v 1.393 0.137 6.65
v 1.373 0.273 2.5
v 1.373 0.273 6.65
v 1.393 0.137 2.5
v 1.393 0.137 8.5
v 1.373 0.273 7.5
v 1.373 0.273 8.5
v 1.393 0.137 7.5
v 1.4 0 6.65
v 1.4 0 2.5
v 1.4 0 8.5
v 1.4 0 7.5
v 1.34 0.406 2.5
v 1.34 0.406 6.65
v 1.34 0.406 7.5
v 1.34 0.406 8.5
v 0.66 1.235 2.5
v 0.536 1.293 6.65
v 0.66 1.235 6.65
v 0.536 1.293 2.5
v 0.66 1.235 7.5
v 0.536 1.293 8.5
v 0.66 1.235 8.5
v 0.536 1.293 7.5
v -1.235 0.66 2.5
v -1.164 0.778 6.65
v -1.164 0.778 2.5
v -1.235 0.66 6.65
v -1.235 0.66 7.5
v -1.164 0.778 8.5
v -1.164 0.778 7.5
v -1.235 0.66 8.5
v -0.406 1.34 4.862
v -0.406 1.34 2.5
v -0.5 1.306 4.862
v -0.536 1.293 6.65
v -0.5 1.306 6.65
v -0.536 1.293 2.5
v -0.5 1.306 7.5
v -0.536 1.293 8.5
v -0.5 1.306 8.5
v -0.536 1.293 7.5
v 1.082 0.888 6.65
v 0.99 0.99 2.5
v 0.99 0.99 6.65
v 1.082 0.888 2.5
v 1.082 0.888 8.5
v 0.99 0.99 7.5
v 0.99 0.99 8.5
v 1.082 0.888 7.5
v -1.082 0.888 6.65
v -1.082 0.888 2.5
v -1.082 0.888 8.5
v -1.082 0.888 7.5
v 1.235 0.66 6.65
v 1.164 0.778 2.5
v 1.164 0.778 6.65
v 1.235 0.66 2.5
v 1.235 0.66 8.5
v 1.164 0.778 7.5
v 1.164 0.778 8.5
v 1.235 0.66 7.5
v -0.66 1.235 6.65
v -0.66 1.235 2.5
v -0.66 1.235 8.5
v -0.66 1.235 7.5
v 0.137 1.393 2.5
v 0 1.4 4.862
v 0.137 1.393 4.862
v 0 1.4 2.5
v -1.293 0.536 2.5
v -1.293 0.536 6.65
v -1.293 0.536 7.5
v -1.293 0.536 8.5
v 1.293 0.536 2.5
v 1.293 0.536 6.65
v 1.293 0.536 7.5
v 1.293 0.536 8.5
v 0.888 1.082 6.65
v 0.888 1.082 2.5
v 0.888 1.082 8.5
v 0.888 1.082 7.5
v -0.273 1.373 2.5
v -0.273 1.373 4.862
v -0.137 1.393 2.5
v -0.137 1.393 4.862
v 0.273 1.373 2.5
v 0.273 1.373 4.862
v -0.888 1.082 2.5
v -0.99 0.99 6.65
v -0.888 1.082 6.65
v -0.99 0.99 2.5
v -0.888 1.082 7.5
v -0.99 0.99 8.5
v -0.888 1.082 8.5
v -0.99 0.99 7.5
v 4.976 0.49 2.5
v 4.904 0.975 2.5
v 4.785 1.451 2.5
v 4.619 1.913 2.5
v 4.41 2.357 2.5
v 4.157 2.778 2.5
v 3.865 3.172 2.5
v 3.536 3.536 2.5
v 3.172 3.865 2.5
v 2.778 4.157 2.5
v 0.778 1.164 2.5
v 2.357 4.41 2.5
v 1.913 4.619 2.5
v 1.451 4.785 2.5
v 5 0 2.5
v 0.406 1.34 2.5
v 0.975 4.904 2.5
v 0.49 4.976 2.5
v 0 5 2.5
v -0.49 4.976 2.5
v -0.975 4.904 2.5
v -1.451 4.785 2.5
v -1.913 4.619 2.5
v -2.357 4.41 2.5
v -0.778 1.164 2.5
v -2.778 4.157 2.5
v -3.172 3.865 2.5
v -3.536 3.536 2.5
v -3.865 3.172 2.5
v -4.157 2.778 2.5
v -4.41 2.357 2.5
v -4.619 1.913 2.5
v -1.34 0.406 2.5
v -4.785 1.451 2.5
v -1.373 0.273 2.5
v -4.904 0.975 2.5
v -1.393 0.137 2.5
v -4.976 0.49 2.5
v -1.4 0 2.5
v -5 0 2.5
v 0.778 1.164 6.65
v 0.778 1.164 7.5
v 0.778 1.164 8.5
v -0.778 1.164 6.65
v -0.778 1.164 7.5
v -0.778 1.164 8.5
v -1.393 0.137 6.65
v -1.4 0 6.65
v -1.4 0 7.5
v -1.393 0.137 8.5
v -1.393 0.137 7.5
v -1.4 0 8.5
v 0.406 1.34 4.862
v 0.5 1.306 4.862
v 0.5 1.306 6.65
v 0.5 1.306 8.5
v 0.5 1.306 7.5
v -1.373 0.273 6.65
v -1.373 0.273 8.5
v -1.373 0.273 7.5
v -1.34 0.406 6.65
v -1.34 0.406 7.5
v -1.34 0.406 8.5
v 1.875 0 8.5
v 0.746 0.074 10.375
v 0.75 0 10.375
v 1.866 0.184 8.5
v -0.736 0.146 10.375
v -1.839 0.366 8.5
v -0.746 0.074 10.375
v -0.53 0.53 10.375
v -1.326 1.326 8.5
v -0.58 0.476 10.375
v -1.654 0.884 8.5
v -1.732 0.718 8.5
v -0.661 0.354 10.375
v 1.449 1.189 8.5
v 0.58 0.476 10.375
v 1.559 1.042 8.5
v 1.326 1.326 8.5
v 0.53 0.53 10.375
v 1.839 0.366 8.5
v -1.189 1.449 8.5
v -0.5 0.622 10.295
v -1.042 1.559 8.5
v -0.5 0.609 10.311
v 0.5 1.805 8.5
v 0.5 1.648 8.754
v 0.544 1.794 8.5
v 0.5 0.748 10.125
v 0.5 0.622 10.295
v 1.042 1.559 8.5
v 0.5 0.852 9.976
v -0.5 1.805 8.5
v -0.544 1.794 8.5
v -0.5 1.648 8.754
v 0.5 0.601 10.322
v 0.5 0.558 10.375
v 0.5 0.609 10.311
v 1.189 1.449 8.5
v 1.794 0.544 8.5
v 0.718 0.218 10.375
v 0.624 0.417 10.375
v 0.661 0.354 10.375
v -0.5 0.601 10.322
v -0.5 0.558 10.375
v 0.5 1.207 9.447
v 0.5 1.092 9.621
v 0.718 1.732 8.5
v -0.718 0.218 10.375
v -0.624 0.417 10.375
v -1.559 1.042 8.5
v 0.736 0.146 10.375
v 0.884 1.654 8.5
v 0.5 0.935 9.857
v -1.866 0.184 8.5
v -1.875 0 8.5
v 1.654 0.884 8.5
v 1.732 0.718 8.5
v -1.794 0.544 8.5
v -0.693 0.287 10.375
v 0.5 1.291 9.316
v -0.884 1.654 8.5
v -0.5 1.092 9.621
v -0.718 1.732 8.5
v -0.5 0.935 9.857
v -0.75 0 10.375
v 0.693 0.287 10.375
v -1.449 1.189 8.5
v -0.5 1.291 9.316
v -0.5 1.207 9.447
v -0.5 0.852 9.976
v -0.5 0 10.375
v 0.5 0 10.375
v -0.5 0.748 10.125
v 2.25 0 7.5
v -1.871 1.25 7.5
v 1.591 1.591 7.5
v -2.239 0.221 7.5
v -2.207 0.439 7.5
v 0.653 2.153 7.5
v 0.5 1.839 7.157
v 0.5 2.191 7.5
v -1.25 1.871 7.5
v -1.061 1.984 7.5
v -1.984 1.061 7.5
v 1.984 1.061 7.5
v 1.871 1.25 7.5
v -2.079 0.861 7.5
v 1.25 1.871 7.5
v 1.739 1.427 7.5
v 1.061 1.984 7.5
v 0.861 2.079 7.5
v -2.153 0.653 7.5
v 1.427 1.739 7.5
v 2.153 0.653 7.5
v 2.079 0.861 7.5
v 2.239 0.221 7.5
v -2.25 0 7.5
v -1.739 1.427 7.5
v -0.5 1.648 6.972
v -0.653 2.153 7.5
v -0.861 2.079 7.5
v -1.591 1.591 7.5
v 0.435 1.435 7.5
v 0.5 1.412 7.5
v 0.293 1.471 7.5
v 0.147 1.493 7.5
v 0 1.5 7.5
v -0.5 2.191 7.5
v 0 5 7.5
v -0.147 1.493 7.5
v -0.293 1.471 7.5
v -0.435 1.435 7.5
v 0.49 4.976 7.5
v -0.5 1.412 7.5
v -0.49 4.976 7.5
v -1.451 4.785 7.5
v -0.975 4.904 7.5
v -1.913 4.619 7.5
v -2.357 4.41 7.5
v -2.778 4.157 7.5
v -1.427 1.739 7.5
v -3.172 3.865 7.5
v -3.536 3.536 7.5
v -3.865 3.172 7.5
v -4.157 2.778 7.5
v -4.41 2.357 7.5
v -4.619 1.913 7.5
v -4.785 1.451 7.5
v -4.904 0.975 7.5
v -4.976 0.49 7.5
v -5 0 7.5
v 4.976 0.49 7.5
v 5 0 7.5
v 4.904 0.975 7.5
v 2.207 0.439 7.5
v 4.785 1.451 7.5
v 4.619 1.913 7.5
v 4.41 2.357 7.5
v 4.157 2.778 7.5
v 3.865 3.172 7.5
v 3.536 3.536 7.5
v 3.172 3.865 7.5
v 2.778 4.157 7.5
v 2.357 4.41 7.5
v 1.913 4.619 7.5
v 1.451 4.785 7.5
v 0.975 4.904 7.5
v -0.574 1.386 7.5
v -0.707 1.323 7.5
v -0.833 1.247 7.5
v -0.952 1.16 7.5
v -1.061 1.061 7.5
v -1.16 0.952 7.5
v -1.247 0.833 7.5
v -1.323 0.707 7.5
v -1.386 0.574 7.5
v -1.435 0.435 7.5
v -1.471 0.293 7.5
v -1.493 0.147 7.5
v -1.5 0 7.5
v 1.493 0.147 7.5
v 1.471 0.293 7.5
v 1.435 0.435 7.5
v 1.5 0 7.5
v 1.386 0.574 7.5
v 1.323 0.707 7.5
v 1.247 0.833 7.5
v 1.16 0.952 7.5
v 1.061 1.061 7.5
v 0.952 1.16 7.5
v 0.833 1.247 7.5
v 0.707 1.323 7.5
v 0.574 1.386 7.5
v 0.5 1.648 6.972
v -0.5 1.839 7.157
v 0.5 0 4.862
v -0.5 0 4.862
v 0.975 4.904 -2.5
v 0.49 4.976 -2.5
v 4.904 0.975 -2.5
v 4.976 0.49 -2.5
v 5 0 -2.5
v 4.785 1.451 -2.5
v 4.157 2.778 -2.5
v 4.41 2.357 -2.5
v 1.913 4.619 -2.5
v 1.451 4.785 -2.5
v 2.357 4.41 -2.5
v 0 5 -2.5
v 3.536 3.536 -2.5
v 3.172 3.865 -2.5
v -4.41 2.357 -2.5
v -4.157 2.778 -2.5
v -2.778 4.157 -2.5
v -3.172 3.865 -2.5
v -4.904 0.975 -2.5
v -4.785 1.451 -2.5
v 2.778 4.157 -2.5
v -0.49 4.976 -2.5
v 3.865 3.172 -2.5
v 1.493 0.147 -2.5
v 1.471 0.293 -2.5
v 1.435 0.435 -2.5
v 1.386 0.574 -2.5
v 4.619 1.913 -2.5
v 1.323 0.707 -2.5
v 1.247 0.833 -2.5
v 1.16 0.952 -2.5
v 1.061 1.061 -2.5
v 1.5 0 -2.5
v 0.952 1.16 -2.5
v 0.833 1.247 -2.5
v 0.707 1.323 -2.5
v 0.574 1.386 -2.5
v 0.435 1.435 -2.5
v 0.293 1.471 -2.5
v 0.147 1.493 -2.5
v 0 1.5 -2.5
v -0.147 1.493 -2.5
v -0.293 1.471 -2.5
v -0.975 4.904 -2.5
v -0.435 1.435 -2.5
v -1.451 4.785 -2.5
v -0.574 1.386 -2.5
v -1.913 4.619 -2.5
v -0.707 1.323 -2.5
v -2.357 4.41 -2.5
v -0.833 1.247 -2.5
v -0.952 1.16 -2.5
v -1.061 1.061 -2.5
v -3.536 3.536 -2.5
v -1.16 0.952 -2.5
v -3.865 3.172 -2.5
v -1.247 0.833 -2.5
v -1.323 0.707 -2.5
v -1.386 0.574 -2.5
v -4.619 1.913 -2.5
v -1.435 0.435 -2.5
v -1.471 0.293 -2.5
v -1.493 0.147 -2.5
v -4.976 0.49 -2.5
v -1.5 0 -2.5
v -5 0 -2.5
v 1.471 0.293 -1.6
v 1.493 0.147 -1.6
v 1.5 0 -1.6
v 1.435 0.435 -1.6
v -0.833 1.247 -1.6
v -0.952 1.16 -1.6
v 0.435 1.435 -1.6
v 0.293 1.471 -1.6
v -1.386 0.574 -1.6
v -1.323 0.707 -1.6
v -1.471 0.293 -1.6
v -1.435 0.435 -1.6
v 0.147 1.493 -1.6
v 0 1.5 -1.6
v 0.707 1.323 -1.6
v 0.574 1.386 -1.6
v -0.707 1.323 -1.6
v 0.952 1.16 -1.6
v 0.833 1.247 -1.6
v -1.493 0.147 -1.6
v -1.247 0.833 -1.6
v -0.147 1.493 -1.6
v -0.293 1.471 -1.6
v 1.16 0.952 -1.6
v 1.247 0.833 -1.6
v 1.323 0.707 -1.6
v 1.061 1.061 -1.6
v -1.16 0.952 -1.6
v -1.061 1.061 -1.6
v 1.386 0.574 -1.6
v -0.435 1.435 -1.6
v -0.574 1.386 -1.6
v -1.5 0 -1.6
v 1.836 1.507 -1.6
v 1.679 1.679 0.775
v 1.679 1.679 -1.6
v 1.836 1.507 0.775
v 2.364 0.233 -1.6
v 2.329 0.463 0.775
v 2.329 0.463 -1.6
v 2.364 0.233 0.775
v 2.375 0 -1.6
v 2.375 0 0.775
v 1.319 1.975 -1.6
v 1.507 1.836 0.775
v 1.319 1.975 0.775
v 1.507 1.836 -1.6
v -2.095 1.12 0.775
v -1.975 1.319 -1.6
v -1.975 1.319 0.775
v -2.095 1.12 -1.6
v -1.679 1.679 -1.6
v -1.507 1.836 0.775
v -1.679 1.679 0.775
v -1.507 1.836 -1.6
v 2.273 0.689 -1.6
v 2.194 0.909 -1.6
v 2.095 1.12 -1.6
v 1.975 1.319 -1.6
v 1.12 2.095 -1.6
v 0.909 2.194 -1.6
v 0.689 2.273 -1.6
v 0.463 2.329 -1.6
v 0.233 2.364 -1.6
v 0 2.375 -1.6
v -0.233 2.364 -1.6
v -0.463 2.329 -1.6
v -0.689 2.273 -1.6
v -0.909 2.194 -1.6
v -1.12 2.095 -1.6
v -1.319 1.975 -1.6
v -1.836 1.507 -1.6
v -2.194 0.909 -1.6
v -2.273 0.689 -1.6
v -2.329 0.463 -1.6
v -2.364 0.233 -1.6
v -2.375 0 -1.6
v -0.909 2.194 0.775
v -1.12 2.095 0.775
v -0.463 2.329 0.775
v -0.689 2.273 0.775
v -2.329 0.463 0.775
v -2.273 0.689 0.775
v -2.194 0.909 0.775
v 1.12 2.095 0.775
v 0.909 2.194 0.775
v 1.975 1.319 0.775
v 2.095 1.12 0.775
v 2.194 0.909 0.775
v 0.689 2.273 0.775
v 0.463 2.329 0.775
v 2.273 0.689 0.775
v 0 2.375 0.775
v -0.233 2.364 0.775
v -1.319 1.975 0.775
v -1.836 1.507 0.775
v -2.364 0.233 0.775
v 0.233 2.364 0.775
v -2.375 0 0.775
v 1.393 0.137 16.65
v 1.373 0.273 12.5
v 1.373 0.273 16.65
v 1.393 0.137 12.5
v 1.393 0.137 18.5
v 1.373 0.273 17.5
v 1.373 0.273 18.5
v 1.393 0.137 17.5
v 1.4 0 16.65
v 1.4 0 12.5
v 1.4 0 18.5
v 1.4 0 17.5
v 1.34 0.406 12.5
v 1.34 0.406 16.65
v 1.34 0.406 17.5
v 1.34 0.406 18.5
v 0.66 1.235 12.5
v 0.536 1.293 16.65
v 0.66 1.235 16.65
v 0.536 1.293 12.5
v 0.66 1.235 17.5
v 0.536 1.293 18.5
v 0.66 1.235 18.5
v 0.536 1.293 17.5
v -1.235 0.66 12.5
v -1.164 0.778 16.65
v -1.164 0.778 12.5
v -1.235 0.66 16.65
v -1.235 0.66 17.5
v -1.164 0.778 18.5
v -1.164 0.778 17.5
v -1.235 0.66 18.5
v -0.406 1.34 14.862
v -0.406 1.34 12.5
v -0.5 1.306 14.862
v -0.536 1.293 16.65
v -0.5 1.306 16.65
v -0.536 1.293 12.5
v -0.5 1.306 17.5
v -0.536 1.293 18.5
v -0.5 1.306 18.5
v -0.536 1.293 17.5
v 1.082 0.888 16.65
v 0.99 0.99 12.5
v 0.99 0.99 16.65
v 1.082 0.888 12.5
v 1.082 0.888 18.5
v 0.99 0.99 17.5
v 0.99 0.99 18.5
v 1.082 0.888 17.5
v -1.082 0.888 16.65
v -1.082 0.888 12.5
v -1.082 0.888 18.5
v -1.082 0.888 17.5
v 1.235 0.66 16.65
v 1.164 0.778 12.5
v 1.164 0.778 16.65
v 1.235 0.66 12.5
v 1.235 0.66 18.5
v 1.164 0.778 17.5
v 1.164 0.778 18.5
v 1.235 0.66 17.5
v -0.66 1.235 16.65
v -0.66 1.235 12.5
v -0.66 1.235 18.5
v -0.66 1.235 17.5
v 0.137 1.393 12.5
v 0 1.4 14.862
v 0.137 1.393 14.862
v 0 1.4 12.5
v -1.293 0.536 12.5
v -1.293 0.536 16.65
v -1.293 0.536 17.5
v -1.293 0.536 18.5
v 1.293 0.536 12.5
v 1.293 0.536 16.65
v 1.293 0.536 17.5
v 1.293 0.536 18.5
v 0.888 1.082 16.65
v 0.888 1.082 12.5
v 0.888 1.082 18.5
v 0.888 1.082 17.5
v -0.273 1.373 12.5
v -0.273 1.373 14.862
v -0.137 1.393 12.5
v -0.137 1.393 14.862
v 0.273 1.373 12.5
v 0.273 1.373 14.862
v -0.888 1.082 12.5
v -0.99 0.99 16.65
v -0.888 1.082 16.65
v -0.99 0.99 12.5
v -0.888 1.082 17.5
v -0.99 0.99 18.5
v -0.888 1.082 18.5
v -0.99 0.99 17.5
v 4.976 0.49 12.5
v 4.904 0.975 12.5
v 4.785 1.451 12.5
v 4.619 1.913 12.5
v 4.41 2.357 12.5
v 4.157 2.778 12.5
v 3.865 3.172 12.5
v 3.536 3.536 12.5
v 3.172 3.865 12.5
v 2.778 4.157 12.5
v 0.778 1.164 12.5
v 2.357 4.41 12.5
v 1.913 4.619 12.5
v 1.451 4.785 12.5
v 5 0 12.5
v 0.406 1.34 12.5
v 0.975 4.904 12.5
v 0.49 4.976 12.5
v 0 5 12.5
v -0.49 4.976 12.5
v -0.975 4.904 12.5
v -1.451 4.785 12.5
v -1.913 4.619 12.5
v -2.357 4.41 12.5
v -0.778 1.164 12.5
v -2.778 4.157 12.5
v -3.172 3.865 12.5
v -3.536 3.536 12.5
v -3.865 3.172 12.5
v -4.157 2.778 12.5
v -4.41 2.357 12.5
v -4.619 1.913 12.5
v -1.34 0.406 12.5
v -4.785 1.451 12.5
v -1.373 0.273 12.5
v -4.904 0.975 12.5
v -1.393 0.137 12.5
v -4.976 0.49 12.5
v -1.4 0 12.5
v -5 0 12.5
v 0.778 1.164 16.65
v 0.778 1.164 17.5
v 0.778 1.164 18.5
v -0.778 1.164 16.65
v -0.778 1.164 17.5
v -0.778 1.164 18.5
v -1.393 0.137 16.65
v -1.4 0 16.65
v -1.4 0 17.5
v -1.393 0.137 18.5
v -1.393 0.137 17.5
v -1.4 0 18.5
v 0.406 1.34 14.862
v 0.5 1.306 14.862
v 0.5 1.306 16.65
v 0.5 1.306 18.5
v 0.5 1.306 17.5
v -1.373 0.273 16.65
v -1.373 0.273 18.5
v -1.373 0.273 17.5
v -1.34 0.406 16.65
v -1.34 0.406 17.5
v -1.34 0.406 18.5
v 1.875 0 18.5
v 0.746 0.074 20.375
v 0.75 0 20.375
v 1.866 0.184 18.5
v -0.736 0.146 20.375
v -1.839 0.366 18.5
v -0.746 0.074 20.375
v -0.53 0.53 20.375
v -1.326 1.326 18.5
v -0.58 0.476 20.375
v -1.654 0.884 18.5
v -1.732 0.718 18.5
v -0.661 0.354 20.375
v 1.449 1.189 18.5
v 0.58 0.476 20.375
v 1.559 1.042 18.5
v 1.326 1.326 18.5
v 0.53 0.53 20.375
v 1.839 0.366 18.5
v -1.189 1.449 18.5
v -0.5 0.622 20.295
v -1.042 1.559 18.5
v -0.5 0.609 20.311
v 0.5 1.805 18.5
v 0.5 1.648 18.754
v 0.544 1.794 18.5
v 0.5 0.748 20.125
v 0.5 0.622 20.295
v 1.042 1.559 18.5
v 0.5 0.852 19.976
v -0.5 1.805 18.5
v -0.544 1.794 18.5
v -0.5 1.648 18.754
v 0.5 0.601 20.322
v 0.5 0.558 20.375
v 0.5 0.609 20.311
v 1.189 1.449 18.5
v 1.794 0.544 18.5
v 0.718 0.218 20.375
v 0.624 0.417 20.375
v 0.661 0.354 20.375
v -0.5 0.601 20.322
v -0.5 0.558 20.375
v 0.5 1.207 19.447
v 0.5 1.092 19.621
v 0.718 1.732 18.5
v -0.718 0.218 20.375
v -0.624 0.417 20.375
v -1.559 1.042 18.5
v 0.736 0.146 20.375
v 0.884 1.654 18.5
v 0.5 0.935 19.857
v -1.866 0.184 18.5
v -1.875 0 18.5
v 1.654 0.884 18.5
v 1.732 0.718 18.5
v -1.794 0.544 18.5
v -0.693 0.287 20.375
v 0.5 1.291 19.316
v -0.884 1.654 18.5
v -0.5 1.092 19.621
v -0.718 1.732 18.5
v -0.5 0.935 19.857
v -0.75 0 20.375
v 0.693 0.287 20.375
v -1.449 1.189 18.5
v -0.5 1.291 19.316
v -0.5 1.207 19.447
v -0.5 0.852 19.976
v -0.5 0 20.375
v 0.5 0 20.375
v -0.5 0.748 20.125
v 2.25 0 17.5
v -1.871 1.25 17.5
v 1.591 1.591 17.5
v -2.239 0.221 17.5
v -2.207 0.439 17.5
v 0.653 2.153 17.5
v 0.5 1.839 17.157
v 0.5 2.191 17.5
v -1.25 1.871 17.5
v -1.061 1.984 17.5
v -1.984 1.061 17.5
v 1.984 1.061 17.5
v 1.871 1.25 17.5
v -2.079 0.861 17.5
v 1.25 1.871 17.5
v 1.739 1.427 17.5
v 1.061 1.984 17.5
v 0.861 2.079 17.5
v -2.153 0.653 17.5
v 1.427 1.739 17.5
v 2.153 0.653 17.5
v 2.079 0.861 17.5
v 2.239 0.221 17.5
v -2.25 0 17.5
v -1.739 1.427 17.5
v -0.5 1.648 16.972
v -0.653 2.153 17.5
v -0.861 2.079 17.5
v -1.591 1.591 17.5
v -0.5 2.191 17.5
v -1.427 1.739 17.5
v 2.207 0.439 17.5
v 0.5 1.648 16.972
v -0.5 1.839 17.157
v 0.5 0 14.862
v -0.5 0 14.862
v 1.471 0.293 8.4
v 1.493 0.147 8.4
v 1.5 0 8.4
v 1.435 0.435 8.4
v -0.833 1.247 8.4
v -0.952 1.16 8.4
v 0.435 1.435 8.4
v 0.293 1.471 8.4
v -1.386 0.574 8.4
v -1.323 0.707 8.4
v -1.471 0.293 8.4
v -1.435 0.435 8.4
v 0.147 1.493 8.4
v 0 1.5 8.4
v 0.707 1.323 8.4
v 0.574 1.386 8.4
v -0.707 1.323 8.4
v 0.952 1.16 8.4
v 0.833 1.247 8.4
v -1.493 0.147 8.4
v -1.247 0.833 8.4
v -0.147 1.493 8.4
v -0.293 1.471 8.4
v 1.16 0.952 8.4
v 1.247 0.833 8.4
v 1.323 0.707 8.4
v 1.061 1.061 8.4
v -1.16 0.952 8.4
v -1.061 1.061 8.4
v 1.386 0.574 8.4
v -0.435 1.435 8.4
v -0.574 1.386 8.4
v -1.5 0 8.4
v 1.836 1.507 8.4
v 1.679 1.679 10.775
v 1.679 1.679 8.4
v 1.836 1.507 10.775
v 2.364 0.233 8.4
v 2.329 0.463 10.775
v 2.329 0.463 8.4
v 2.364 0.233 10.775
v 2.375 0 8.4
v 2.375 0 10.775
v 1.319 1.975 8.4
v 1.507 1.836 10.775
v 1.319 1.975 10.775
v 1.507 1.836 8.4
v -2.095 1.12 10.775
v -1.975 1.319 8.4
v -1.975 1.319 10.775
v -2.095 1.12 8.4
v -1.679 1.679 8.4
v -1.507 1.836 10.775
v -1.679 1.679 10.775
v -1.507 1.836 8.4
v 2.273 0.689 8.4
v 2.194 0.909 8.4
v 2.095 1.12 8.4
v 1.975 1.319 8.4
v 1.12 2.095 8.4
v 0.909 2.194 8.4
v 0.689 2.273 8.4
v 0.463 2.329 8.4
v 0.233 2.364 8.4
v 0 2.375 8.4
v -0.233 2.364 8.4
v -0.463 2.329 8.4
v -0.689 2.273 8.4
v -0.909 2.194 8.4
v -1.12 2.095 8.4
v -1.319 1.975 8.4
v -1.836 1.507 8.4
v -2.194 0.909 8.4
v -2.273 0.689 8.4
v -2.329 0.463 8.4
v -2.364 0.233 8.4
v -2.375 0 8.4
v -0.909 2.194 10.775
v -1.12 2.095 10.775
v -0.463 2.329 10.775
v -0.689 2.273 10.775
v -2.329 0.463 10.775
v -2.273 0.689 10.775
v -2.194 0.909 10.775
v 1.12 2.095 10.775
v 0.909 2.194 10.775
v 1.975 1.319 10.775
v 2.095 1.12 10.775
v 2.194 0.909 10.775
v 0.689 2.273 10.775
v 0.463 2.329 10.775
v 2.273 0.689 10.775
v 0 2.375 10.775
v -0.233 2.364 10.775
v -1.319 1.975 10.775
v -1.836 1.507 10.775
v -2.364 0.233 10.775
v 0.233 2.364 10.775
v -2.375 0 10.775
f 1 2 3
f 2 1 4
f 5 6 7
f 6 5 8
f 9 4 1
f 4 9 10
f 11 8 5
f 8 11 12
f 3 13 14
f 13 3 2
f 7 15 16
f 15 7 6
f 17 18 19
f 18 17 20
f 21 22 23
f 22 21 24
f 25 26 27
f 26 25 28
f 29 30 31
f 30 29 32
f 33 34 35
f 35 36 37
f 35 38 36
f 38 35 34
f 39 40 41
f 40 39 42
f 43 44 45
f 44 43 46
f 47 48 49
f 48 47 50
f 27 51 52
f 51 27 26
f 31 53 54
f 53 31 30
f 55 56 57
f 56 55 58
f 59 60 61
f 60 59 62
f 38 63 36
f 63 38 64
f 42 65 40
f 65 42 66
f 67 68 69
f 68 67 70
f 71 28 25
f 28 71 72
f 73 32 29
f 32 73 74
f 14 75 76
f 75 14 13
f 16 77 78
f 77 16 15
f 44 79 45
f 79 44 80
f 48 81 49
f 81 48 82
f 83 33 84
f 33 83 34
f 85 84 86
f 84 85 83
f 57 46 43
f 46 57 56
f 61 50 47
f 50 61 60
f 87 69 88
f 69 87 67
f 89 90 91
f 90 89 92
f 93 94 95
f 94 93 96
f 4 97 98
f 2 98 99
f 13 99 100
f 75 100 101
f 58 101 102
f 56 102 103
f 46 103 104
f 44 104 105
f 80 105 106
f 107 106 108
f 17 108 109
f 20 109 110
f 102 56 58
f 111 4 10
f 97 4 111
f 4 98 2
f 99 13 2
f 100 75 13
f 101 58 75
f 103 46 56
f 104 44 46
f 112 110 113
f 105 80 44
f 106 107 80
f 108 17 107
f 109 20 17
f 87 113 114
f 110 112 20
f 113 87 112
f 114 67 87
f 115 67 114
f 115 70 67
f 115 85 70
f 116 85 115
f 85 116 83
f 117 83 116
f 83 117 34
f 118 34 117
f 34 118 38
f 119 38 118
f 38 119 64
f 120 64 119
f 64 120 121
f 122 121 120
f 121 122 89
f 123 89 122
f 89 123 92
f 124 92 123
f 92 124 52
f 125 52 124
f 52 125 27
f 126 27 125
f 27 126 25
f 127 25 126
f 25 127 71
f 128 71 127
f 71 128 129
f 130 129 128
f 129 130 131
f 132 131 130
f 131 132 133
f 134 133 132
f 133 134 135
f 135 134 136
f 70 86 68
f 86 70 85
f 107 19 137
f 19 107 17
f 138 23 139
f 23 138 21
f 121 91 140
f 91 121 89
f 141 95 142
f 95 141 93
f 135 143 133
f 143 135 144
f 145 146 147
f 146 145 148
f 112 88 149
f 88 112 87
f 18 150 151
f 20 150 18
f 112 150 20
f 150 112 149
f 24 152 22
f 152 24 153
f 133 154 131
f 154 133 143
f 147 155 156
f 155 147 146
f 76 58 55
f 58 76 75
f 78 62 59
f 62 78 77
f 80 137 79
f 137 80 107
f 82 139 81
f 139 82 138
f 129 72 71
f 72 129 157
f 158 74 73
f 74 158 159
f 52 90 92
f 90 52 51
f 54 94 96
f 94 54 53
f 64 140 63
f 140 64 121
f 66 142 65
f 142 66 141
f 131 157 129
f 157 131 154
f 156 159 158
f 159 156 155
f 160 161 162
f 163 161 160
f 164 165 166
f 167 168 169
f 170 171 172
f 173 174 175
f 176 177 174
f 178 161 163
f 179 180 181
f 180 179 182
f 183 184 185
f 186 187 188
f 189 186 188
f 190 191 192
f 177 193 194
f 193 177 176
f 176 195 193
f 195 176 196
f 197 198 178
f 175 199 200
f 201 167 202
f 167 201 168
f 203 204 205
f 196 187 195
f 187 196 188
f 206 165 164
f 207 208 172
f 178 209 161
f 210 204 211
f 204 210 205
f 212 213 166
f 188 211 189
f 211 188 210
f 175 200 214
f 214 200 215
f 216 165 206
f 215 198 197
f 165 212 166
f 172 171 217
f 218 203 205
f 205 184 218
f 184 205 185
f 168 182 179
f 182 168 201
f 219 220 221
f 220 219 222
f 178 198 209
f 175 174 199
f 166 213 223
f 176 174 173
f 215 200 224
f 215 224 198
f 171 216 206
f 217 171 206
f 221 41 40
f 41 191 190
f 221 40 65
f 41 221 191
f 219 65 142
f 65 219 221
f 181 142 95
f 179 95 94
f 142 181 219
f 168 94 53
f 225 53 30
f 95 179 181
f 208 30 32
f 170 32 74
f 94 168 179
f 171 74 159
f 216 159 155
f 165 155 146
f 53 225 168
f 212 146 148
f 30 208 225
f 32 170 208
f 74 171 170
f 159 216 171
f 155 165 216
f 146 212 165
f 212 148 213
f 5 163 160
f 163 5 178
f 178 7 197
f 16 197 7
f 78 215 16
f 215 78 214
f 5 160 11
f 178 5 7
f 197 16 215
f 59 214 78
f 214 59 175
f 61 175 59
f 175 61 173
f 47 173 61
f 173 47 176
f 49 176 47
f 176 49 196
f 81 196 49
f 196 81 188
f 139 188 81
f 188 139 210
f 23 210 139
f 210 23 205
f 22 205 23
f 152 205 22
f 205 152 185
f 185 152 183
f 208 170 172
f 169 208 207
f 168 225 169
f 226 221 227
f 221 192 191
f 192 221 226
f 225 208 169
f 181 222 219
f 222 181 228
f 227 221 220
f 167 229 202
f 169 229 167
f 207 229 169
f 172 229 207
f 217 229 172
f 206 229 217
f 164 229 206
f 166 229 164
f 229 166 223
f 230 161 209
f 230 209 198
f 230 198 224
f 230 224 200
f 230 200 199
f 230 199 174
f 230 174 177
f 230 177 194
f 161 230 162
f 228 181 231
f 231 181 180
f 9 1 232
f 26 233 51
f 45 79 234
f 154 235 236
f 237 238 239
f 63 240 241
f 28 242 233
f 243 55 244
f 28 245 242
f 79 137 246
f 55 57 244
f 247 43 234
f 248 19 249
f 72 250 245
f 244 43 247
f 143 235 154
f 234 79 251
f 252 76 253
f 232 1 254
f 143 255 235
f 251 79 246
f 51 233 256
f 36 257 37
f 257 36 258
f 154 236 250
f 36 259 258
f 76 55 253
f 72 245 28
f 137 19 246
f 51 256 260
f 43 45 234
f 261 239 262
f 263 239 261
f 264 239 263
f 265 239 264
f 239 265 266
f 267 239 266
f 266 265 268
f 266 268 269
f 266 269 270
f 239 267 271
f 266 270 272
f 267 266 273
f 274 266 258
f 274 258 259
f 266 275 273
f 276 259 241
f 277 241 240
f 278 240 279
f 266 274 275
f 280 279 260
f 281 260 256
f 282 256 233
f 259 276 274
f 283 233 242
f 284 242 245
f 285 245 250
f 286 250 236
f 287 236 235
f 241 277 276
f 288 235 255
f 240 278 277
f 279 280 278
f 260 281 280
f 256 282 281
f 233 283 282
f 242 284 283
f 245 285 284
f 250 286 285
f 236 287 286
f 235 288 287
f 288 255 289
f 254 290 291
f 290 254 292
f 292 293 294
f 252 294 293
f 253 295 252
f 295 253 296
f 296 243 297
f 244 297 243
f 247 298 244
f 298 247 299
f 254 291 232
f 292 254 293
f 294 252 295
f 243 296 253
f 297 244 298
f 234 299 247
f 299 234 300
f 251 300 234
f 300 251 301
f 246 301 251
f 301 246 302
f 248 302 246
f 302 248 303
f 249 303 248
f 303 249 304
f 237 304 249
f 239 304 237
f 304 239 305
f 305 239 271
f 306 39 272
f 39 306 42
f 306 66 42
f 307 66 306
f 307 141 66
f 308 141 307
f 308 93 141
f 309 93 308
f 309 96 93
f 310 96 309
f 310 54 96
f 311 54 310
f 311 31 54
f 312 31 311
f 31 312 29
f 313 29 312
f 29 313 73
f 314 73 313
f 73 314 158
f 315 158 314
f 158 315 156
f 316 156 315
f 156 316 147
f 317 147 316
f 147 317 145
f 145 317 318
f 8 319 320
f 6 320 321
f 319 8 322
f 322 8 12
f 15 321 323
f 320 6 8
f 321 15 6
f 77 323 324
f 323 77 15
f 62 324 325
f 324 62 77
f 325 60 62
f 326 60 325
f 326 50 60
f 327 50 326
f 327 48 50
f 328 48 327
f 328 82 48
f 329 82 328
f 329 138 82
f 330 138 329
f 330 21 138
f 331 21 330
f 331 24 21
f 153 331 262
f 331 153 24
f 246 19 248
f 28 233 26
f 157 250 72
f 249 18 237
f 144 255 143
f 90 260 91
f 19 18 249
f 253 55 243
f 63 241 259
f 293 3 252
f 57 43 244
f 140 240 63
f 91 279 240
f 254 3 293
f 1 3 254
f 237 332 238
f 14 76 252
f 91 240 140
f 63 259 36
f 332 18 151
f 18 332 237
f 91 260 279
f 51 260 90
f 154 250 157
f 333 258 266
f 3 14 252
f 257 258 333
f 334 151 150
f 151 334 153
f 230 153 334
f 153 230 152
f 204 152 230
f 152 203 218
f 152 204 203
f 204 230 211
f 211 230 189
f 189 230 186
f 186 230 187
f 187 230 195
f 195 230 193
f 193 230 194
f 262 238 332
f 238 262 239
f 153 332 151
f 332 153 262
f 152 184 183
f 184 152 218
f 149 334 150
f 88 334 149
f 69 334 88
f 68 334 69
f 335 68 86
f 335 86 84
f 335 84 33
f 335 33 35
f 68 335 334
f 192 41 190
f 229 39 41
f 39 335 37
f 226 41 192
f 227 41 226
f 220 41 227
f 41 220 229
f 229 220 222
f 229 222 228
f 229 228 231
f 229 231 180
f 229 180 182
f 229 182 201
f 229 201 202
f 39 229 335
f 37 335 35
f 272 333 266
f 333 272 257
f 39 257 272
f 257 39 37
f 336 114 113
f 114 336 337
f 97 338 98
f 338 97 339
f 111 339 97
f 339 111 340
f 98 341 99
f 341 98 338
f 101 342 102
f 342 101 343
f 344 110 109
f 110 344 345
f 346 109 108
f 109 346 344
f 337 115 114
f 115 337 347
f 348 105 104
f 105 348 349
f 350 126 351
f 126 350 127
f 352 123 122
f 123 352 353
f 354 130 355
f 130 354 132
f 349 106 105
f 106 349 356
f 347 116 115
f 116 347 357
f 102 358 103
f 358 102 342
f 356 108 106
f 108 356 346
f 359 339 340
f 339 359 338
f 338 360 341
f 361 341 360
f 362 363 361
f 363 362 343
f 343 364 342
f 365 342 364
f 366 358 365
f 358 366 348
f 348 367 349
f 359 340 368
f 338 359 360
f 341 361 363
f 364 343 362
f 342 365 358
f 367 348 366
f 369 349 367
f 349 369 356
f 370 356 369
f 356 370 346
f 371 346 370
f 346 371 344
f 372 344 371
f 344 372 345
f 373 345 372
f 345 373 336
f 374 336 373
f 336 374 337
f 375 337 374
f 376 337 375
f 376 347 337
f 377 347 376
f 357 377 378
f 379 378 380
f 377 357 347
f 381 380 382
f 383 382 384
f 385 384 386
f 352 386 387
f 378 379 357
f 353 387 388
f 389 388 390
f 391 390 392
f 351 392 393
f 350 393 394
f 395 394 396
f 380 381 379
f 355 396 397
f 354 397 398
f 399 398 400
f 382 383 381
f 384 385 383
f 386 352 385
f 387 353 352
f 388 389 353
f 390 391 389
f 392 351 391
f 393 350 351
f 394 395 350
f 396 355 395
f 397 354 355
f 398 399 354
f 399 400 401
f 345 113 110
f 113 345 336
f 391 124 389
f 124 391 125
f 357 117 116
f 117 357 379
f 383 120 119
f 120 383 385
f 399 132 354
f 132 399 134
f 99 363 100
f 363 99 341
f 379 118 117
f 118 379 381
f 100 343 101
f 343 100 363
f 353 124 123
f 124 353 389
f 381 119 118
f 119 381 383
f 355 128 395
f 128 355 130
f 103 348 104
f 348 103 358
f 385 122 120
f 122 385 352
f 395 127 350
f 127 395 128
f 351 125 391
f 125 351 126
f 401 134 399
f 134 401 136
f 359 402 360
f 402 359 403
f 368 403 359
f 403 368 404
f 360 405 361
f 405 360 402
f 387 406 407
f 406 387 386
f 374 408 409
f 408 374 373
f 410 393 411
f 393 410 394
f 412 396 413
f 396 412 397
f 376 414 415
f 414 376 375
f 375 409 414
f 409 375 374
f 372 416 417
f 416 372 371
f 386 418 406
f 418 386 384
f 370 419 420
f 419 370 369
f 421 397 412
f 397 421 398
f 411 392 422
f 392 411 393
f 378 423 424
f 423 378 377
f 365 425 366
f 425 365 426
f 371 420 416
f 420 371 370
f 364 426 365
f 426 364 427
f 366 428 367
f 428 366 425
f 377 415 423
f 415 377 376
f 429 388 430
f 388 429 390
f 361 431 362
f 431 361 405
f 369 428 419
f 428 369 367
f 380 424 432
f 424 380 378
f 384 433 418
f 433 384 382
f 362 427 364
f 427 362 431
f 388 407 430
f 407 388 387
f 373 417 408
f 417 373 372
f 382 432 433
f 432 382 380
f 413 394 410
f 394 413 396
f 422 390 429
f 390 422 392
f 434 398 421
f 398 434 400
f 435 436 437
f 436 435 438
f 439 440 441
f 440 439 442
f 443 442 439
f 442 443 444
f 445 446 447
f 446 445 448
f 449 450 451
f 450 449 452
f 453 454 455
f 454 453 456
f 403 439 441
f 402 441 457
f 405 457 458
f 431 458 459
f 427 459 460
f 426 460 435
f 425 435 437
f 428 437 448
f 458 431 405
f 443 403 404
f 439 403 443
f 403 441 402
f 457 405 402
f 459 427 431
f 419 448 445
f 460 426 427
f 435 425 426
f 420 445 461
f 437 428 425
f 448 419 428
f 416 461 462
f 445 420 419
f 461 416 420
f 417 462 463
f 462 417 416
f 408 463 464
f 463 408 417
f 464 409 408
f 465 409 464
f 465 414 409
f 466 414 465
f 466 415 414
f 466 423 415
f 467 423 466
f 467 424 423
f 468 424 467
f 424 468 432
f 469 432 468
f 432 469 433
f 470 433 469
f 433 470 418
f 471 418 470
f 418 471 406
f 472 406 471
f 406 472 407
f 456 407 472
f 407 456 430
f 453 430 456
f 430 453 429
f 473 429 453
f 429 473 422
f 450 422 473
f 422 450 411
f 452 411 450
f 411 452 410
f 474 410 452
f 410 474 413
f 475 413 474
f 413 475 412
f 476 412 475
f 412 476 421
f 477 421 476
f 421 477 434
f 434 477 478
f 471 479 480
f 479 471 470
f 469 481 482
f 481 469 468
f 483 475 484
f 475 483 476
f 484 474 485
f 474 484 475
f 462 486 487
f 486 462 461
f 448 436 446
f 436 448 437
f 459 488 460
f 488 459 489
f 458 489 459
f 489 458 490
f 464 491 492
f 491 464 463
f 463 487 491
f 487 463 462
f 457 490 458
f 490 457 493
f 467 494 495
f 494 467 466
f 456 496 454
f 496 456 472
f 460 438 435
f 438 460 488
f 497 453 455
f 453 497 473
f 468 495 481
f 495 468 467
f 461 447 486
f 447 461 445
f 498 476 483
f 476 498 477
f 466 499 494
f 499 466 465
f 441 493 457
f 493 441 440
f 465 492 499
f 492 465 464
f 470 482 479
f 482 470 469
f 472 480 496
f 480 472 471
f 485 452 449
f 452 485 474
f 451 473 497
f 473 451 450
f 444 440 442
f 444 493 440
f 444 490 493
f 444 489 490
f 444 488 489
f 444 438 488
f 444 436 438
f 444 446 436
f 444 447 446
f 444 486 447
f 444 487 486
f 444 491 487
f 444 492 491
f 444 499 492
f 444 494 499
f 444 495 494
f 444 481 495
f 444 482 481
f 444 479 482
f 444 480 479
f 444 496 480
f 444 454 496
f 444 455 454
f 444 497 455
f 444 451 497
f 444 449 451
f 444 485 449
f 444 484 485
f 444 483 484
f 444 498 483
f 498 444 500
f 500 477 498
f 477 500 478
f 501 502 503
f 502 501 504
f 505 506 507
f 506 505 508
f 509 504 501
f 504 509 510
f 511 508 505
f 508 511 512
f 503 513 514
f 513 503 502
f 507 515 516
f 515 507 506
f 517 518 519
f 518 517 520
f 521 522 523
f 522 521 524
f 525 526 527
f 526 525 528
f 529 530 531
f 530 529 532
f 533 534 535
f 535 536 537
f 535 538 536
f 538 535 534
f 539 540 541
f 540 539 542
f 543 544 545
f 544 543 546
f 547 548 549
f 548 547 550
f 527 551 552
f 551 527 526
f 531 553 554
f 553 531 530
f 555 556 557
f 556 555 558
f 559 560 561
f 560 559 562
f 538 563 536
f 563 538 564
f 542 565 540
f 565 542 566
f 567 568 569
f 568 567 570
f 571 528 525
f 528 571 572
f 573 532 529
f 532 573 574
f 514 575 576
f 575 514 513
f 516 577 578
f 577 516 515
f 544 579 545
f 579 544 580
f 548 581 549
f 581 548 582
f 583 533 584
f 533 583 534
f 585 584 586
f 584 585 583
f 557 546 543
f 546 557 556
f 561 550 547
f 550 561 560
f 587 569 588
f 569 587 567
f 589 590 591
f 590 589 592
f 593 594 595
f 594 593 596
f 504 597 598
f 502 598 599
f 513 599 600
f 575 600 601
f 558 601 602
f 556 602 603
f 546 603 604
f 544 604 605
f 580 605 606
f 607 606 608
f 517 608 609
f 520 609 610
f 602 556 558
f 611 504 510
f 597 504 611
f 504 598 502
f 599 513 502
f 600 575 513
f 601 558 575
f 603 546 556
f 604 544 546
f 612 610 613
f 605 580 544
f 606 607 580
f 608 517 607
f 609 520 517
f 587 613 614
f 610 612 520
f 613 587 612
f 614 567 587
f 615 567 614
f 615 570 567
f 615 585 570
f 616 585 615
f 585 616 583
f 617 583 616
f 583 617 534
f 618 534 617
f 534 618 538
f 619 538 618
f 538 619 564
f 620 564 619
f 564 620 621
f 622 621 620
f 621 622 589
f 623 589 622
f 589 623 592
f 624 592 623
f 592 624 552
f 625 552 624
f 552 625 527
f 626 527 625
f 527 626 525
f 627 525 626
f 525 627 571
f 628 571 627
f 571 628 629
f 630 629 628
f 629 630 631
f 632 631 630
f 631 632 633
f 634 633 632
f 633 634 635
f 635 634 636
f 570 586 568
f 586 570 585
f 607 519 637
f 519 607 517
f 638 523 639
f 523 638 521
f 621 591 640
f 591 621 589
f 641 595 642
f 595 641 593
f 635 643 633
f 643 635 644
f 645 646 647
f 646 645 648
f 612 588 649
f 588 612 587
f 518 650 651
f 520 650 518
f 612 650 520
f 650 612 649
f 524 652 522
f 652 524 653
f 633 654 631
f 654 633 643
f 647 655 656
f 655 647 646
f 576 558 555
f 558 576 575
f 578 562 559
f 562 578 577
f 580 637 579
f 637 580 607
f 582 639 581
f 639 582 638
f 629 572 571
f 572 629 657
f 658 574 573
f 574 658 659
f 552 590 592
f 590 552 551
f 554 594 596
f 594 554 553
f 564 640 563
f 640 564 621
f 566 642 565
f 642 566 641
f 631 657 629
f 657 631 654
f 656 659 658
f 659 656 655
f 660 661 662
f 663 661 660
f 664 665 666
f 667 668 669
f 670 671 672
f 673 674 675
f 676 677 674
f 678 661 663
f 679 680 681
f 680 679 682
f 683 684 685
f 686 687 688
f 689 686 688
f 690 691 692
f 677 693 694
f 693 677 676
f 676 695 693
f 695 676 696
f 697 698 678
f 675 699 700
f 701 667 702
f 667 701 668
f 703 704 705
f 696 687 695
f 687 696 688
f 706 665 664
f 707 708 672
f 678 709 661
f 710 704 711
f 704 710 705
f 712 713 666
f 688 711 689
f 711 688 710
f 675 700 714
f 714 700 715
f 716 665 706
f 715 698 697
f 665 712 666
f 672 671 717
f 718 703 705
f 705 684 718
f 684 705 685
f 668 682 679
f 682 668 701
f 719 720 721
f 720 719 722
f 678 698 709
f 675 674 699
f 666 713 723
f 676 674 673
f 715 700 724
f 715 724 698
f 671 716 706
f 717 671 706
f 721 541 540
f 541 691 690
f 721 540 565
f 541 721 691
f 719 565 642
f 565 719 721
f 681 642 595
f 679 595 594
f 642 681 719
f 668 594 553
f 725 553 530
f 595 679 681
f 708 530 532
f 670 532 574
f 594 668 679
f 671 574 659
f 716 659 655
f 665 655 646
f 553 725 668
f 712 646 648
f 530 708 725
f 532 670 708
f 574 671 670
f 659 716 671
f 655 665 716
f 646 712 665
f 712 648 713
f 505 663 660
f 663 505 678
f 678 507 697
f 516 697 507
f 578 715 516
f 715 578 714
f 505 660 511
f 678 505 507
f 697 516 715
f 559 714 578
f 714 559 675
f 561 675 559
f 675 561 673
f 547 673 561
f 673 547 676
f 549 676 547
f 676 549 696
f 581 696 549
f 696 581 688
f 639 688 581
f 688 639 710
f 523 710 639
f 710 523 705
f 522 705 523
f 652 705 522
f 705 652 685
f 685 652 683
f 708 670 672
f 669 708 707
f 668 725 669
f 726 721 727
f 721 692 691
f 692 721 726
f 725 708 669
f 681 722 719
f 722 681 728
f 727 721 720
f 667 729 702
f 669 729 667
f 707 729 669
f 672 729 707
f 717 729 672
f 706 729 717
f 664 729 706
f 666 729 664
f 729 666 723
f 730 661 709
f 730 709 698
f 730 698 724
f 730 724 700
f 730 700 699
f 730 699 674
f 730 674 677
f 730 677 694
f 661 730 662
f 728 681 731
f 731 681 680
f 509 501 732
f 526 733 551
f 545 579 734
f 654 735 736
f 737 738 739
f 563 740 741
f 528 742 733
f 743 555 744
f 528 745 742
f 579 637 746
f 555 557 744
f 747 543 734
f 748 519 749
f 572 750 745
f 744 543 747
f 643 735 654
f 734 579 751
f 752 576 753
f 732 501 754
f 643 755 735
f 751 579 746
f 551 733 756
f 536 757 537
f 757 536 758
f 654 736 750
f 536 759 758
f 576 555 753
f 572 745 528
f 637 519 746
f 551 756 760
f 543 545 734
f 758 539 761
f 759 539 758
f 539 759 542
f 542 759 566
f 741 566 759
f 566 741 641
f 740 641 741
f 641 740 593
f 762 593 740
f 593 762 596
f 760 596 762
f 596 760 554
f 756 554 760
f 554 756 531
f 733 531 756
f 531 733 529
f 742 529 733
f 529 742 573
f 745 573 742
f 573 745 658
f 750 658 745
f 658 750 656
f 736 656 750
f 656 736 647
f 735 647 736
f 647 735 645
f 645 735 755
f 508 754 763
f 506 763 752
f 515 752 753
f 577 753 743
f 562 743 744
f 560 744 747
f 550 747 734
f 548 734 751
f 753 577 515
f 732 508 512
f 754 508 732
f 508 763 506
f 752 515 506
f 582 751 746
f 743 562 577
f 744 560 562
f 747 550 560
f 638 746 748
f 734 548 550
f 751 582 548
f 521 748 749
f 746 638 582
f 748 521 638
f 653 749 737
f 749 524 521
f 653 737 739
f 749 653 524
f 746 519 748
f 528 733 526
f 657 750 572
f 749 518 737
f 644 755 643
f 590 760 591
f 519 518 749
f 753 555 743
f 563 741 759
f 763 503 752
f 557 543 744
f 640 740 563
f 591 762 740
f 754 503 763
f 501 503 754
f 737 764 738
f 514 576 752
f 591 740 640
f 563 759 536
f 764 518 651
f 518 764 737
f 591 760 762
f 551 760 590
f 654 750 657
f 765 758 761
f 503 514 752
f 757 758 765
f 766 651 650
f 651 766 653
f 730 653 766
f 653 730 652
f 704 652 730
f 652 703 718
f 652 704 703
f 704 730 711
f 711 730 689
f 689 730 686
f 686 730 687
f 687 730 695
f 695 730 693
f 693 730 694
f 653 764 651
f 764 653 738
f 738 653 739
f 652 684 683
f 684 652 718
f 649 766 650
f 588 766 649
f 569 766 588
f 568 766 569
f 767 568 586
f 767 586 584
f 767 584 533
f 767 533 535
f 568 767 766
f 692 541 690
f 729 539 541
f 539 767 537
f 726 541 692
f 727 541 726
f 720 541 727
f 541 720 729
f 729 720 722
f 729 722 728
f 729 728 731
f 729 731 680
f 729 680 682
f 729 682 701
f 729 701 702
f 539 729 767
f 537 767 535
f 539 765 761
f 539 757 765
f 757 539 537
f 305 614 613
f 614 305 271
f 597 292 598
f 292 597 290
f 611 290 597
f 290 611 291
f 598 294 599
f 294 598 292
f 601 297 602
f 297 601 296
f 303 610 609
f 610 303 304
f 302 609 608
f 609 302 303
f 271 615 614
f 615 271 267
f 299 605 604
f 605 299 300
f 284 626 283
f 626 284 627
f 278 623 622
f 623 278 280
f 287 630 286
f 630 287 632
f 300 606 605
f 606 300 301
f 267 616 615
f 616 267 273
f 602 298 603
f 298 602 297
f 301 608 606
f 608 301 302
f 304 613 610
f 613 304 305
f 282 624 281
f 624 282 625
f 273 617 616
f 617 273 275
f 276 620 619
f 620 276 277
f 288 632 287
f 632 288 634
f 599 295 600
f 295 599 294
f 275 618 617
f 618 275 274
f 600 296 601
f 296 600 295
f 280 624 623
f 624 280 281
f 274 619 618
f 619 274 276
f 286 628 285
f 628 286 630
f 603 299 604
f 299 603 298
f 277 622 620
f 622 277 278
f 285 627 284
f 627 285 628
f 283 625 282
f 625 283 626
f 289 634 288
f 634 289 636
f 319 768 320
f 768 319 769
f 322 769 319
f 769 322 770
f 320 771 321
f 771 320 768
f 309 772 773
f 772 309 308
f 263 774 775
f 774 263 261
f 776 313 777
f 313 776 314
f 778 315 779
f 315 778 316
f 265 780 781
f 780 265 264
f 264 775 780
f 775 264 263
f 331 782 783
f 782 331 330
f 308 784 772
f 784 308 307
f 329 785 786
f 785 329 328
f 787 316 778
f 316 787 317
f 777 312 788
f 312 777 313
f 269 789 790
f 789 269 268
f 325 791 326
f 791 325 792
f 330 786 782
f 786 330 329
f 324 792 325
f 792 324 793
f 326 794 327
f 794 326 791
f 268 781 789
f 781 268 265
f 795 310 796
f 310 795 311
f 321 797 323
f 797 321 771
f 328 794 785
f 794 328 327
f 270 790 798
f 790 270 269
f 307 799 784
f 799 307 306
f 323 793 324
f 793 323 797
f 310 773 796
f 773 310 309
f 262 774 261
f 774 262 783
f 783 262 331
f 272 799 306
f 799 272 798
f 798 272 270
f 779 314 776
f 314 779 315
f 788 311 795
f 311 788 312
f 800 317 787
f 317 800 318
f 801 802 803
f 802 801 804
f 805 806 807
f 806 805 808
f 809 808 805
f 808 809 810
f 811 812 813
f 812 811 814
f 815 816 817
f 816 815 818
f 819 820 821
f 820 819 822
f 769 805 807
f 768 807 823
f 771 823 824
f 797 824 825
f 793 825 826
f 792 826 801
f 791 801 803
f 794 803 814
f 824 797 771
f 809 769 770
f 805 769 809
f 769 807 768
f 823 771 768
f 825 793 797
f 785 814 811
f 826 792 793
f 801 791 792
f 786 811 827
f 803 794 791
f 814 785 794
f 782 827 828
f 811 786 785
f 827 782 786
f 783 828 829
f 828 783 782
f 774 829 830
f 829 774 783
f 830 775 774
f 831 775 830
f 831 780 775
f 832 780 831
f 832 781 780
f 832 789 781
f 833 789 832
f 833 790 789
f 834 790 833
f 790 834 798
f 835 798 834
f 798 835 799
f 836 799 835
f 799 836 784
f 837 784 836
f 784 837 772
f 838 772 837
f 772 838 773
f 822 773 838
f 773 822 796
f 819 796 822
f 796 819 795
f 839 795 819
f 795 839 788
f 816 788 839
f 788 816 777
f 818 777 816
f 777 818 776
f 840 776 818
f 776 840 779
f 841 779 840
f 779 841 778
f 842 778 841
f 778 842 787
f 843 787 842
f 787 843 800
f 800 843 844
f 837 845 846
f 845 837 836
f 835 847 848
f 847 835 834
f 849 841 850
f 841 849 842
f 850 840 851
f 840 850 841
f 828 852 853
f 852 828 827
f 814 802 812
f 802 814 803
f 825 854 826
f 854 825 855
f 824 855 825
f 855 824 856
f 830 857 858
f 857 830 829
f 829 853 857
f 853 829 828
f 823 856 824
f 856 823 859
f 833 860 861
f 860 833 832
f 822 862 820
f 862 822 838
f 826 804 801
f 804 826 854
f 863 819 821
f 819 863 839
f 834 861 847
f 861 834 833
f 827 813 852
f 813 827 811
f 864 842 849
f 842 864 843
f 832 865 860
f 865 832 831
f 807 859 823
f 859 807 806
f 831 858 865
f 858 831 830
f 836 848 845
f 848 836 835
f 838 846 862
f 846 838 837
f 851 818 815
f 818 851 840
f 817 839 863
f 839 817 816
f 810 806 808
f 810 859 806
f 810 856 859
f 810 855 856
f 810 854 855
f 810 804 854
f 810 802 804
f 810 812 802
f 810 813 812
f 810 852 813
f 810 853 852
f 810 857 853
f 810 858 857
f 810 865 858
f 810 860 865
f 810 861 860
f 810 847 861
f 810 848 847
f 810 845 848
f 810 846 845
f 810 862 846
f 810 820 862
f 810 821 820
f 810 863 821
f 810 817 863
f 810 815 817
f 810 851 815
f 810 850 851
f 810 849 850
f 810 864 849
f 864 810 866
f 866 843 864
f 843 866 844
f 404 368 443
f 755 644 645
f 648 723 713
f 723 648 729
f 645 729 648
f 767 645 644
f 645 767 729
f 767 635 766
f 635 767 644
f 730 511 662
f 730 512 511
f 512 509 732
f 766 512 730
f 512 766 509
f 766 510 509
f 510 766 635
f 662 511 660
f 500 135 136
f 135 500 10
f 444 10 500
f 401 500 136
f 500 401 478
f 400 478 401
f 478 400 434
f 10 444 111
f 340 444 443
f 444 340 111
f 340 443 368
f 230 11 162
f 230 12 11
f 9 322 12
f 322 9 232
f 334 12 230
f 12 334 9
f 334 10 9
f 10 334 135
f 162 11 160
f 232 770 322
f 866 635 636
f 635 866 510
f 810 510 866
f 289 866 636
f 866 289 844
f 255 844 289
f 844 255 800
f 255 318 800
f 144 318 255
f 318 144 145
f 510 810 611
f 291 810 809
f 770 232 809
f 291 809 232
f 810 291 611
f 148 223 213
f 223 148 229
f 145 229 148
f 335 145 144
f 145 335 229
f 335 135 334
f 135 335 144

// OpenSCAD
// file: ../snapfit.scad
// snapfit.scad: round, slotted snap-fit pins that print without supports.
//
// snapfit() is the pin: a column with a cone-shaped head, slotted so the head's two
// halves flex together on the way through. snapfit_neg() is the hole it snaps into,
// to subtract from the mating part: a narrow throat the head squeezes past, and a
// pocket above where the head opens out again. MIT licence; see LICENSE.
//
// Both build the head from dia and lip: it is (dia + lip) / 2 tall, on a base
// dia + lip across, and narrows to dia / 2 across at the top.

$fn = 64;

function _head_r(dia, lip) = (dia + lip) / 2;
function _head_h(dia, lip) = (dia + lip) / 2;
// The narrow throat of the hole: the column's own size, so a seated column clears
// it and the head's wider base cannot pass back out.
function _throat_r(dia) = dia / 2;

/**
 * The pin, standing on z = 0.
 *   dia                 column diameter, before col_tol
 *   lip                 how much wider the head's base is than dia
 *   col_h               column height, from z = 0 to the head
 *   col_tol             taken off the column's radius
 *   slot_ratio          the slot's depth, as a fraction of column plus head height
 *   thickness           if set, a foot this far below the head, to trap a plate of
 *                       this thickness between foot and head
 *   under_chamfer_angle if set, a cone of this angle under the head, so the catch
 *                       is a slope instead of a step (for flexible filament)
 */
module snapfit(
    dia = 3,
    lip = 0.75,
    col_h = 6,
    col_tol = 0.1,
    slot_ratio = 0.7,
    thickness = undef,
    under_chamfer_angle = undef
) {
    col_r = dia / 2 - col_tol;
    head_r = _head_r(dia, lip);
    head_h = _head_h(dia, lip);
    total = col_h + head_h;
    slot_w = dia / 3;
    slot_d = slot_ratio * total;
    difference() {
        union() {
            cylinder(r=col_r, h=col_h + 0.01);
            translate([0, 0, col_h]) cylinder(r1=head_r, r2=dia / 4, h=head_h);
            if (!is_undef(under_chamfer_angle)) {
                // From the head's rim down to the column, at the given angle from horizontal.
                drop = (head_r - col_r) * tan(under_chamfer_angle);
                translate([0, 0, col_h - drop]) cylinder(r1=col_r, r2=head_r, h=drop);
            }
            if (!is_undef(thickness)) {
                // The foot: a 45 degree cone whose flat top is `thickness` below the head,
                // flaring out to `lip` past the head's rim so the plate has a shoulder to sit on.
                foot_r = head_r + lip / 2;
                translate([0, 0, col_h - thickness - (foot_r - col_r)])
                    cylinder(r1=col_r, r2=foot_r, h=foot_r - col_r);
            }
        }
        translate([-slot_w / 2, -head_r - 1, total - slot_d]) cube([slot_w, 2 * head_r + 2, slot_d + 1]);
    }
}

/**
 * The hole for a pin, to subtract from the mating part, starting at z = 0.
 *   dia, lip, col_h, slot_ratio  match the pin
 *   neg_tol             clearance around the head in the pocket
 *   thickness           if set, the throat is this deep (the plate the head snaps
 *                       past); otherwise col_h
 *   flip                mirror it top to bottom, for a pin entering from above
 *   under_chamfer_angle clearance for a pin with an under chamfer
 */
module snapfit_neg(
    dia = 3,
    lip = 0.75,
    col_h = 6,
    neg_tol = 0.5,
    slot_ratio = 0.7,
    thickness = undef,
    flip = false,
    under_chamfer_angle = undef
) {
    throat = is_undef(thickness) ? col_h : thickness;
    head_r = _head_r(dia, lip);
    pocket_r = head_r + neg_tol;
    pocket_h = _head_h(dia, lip) + neg_tol;
    total = throat + pocket_h;
    module shape() {
        cylinder(r=_throat_r(dia), h=throat + 0.01);
        translate([0, 0, throat]) cylinder(r=pocket_r, h=pocket_h);
        if (!is_undef(under_chamfer_angle)) {
            // Room for the pin's under chamfer: a cone down from the pocket's floor.
            drop = (pocket_r - _throat_r(dia)) * tan(under_chamfer_angle);
            translate([0, 0, throat - drop]) cylinder(r1=_throat_r(dia), r2=pocket_r, h=drop + 0.01);
        }
    }
    if (flip)
        translate([0, 0, total]) mirror([0, 0, 1]) shape();
    else
        shape();
}
// main file
// Two self-connecting discs snapped together, cut in half to show the pin in its hole.
// For looking at, not printing.
use <../snapfit.scad>;

w = 10;
h = 5;
dia = 3;
lip = 0.75;
col_h = dia * 2;
neg_tol = 0.5;
thickness = 1;
$fn = 64;

module disc() {
    difference() {
        union() {
            cylinder(d=w, h=h, center=true);
            translate([0, 0, h / 2]) snapfit(dia, lip, col_h, 0.1, 0.7, thickness=thickness);
        }
        translate([0, 0, -h / 2 - 0.1]) snapfit_neg(dia, lip, col_h, neg_tol, 0.7, thickness=thickness);
    }
}

// Seated: the upper disc rests on the lower one's foot.
seat = h + col_h - thickness;

difference() {
    union() {
        disc();
        translate([0, 0, seat]) disc();
    }
    // Keep the half behind the y = 0 plane, so the front shows the section.
    translate([-w, -2 * w, -h]) cube([2 * w, 2 * w, 3 * h + seat + 10]);
}
